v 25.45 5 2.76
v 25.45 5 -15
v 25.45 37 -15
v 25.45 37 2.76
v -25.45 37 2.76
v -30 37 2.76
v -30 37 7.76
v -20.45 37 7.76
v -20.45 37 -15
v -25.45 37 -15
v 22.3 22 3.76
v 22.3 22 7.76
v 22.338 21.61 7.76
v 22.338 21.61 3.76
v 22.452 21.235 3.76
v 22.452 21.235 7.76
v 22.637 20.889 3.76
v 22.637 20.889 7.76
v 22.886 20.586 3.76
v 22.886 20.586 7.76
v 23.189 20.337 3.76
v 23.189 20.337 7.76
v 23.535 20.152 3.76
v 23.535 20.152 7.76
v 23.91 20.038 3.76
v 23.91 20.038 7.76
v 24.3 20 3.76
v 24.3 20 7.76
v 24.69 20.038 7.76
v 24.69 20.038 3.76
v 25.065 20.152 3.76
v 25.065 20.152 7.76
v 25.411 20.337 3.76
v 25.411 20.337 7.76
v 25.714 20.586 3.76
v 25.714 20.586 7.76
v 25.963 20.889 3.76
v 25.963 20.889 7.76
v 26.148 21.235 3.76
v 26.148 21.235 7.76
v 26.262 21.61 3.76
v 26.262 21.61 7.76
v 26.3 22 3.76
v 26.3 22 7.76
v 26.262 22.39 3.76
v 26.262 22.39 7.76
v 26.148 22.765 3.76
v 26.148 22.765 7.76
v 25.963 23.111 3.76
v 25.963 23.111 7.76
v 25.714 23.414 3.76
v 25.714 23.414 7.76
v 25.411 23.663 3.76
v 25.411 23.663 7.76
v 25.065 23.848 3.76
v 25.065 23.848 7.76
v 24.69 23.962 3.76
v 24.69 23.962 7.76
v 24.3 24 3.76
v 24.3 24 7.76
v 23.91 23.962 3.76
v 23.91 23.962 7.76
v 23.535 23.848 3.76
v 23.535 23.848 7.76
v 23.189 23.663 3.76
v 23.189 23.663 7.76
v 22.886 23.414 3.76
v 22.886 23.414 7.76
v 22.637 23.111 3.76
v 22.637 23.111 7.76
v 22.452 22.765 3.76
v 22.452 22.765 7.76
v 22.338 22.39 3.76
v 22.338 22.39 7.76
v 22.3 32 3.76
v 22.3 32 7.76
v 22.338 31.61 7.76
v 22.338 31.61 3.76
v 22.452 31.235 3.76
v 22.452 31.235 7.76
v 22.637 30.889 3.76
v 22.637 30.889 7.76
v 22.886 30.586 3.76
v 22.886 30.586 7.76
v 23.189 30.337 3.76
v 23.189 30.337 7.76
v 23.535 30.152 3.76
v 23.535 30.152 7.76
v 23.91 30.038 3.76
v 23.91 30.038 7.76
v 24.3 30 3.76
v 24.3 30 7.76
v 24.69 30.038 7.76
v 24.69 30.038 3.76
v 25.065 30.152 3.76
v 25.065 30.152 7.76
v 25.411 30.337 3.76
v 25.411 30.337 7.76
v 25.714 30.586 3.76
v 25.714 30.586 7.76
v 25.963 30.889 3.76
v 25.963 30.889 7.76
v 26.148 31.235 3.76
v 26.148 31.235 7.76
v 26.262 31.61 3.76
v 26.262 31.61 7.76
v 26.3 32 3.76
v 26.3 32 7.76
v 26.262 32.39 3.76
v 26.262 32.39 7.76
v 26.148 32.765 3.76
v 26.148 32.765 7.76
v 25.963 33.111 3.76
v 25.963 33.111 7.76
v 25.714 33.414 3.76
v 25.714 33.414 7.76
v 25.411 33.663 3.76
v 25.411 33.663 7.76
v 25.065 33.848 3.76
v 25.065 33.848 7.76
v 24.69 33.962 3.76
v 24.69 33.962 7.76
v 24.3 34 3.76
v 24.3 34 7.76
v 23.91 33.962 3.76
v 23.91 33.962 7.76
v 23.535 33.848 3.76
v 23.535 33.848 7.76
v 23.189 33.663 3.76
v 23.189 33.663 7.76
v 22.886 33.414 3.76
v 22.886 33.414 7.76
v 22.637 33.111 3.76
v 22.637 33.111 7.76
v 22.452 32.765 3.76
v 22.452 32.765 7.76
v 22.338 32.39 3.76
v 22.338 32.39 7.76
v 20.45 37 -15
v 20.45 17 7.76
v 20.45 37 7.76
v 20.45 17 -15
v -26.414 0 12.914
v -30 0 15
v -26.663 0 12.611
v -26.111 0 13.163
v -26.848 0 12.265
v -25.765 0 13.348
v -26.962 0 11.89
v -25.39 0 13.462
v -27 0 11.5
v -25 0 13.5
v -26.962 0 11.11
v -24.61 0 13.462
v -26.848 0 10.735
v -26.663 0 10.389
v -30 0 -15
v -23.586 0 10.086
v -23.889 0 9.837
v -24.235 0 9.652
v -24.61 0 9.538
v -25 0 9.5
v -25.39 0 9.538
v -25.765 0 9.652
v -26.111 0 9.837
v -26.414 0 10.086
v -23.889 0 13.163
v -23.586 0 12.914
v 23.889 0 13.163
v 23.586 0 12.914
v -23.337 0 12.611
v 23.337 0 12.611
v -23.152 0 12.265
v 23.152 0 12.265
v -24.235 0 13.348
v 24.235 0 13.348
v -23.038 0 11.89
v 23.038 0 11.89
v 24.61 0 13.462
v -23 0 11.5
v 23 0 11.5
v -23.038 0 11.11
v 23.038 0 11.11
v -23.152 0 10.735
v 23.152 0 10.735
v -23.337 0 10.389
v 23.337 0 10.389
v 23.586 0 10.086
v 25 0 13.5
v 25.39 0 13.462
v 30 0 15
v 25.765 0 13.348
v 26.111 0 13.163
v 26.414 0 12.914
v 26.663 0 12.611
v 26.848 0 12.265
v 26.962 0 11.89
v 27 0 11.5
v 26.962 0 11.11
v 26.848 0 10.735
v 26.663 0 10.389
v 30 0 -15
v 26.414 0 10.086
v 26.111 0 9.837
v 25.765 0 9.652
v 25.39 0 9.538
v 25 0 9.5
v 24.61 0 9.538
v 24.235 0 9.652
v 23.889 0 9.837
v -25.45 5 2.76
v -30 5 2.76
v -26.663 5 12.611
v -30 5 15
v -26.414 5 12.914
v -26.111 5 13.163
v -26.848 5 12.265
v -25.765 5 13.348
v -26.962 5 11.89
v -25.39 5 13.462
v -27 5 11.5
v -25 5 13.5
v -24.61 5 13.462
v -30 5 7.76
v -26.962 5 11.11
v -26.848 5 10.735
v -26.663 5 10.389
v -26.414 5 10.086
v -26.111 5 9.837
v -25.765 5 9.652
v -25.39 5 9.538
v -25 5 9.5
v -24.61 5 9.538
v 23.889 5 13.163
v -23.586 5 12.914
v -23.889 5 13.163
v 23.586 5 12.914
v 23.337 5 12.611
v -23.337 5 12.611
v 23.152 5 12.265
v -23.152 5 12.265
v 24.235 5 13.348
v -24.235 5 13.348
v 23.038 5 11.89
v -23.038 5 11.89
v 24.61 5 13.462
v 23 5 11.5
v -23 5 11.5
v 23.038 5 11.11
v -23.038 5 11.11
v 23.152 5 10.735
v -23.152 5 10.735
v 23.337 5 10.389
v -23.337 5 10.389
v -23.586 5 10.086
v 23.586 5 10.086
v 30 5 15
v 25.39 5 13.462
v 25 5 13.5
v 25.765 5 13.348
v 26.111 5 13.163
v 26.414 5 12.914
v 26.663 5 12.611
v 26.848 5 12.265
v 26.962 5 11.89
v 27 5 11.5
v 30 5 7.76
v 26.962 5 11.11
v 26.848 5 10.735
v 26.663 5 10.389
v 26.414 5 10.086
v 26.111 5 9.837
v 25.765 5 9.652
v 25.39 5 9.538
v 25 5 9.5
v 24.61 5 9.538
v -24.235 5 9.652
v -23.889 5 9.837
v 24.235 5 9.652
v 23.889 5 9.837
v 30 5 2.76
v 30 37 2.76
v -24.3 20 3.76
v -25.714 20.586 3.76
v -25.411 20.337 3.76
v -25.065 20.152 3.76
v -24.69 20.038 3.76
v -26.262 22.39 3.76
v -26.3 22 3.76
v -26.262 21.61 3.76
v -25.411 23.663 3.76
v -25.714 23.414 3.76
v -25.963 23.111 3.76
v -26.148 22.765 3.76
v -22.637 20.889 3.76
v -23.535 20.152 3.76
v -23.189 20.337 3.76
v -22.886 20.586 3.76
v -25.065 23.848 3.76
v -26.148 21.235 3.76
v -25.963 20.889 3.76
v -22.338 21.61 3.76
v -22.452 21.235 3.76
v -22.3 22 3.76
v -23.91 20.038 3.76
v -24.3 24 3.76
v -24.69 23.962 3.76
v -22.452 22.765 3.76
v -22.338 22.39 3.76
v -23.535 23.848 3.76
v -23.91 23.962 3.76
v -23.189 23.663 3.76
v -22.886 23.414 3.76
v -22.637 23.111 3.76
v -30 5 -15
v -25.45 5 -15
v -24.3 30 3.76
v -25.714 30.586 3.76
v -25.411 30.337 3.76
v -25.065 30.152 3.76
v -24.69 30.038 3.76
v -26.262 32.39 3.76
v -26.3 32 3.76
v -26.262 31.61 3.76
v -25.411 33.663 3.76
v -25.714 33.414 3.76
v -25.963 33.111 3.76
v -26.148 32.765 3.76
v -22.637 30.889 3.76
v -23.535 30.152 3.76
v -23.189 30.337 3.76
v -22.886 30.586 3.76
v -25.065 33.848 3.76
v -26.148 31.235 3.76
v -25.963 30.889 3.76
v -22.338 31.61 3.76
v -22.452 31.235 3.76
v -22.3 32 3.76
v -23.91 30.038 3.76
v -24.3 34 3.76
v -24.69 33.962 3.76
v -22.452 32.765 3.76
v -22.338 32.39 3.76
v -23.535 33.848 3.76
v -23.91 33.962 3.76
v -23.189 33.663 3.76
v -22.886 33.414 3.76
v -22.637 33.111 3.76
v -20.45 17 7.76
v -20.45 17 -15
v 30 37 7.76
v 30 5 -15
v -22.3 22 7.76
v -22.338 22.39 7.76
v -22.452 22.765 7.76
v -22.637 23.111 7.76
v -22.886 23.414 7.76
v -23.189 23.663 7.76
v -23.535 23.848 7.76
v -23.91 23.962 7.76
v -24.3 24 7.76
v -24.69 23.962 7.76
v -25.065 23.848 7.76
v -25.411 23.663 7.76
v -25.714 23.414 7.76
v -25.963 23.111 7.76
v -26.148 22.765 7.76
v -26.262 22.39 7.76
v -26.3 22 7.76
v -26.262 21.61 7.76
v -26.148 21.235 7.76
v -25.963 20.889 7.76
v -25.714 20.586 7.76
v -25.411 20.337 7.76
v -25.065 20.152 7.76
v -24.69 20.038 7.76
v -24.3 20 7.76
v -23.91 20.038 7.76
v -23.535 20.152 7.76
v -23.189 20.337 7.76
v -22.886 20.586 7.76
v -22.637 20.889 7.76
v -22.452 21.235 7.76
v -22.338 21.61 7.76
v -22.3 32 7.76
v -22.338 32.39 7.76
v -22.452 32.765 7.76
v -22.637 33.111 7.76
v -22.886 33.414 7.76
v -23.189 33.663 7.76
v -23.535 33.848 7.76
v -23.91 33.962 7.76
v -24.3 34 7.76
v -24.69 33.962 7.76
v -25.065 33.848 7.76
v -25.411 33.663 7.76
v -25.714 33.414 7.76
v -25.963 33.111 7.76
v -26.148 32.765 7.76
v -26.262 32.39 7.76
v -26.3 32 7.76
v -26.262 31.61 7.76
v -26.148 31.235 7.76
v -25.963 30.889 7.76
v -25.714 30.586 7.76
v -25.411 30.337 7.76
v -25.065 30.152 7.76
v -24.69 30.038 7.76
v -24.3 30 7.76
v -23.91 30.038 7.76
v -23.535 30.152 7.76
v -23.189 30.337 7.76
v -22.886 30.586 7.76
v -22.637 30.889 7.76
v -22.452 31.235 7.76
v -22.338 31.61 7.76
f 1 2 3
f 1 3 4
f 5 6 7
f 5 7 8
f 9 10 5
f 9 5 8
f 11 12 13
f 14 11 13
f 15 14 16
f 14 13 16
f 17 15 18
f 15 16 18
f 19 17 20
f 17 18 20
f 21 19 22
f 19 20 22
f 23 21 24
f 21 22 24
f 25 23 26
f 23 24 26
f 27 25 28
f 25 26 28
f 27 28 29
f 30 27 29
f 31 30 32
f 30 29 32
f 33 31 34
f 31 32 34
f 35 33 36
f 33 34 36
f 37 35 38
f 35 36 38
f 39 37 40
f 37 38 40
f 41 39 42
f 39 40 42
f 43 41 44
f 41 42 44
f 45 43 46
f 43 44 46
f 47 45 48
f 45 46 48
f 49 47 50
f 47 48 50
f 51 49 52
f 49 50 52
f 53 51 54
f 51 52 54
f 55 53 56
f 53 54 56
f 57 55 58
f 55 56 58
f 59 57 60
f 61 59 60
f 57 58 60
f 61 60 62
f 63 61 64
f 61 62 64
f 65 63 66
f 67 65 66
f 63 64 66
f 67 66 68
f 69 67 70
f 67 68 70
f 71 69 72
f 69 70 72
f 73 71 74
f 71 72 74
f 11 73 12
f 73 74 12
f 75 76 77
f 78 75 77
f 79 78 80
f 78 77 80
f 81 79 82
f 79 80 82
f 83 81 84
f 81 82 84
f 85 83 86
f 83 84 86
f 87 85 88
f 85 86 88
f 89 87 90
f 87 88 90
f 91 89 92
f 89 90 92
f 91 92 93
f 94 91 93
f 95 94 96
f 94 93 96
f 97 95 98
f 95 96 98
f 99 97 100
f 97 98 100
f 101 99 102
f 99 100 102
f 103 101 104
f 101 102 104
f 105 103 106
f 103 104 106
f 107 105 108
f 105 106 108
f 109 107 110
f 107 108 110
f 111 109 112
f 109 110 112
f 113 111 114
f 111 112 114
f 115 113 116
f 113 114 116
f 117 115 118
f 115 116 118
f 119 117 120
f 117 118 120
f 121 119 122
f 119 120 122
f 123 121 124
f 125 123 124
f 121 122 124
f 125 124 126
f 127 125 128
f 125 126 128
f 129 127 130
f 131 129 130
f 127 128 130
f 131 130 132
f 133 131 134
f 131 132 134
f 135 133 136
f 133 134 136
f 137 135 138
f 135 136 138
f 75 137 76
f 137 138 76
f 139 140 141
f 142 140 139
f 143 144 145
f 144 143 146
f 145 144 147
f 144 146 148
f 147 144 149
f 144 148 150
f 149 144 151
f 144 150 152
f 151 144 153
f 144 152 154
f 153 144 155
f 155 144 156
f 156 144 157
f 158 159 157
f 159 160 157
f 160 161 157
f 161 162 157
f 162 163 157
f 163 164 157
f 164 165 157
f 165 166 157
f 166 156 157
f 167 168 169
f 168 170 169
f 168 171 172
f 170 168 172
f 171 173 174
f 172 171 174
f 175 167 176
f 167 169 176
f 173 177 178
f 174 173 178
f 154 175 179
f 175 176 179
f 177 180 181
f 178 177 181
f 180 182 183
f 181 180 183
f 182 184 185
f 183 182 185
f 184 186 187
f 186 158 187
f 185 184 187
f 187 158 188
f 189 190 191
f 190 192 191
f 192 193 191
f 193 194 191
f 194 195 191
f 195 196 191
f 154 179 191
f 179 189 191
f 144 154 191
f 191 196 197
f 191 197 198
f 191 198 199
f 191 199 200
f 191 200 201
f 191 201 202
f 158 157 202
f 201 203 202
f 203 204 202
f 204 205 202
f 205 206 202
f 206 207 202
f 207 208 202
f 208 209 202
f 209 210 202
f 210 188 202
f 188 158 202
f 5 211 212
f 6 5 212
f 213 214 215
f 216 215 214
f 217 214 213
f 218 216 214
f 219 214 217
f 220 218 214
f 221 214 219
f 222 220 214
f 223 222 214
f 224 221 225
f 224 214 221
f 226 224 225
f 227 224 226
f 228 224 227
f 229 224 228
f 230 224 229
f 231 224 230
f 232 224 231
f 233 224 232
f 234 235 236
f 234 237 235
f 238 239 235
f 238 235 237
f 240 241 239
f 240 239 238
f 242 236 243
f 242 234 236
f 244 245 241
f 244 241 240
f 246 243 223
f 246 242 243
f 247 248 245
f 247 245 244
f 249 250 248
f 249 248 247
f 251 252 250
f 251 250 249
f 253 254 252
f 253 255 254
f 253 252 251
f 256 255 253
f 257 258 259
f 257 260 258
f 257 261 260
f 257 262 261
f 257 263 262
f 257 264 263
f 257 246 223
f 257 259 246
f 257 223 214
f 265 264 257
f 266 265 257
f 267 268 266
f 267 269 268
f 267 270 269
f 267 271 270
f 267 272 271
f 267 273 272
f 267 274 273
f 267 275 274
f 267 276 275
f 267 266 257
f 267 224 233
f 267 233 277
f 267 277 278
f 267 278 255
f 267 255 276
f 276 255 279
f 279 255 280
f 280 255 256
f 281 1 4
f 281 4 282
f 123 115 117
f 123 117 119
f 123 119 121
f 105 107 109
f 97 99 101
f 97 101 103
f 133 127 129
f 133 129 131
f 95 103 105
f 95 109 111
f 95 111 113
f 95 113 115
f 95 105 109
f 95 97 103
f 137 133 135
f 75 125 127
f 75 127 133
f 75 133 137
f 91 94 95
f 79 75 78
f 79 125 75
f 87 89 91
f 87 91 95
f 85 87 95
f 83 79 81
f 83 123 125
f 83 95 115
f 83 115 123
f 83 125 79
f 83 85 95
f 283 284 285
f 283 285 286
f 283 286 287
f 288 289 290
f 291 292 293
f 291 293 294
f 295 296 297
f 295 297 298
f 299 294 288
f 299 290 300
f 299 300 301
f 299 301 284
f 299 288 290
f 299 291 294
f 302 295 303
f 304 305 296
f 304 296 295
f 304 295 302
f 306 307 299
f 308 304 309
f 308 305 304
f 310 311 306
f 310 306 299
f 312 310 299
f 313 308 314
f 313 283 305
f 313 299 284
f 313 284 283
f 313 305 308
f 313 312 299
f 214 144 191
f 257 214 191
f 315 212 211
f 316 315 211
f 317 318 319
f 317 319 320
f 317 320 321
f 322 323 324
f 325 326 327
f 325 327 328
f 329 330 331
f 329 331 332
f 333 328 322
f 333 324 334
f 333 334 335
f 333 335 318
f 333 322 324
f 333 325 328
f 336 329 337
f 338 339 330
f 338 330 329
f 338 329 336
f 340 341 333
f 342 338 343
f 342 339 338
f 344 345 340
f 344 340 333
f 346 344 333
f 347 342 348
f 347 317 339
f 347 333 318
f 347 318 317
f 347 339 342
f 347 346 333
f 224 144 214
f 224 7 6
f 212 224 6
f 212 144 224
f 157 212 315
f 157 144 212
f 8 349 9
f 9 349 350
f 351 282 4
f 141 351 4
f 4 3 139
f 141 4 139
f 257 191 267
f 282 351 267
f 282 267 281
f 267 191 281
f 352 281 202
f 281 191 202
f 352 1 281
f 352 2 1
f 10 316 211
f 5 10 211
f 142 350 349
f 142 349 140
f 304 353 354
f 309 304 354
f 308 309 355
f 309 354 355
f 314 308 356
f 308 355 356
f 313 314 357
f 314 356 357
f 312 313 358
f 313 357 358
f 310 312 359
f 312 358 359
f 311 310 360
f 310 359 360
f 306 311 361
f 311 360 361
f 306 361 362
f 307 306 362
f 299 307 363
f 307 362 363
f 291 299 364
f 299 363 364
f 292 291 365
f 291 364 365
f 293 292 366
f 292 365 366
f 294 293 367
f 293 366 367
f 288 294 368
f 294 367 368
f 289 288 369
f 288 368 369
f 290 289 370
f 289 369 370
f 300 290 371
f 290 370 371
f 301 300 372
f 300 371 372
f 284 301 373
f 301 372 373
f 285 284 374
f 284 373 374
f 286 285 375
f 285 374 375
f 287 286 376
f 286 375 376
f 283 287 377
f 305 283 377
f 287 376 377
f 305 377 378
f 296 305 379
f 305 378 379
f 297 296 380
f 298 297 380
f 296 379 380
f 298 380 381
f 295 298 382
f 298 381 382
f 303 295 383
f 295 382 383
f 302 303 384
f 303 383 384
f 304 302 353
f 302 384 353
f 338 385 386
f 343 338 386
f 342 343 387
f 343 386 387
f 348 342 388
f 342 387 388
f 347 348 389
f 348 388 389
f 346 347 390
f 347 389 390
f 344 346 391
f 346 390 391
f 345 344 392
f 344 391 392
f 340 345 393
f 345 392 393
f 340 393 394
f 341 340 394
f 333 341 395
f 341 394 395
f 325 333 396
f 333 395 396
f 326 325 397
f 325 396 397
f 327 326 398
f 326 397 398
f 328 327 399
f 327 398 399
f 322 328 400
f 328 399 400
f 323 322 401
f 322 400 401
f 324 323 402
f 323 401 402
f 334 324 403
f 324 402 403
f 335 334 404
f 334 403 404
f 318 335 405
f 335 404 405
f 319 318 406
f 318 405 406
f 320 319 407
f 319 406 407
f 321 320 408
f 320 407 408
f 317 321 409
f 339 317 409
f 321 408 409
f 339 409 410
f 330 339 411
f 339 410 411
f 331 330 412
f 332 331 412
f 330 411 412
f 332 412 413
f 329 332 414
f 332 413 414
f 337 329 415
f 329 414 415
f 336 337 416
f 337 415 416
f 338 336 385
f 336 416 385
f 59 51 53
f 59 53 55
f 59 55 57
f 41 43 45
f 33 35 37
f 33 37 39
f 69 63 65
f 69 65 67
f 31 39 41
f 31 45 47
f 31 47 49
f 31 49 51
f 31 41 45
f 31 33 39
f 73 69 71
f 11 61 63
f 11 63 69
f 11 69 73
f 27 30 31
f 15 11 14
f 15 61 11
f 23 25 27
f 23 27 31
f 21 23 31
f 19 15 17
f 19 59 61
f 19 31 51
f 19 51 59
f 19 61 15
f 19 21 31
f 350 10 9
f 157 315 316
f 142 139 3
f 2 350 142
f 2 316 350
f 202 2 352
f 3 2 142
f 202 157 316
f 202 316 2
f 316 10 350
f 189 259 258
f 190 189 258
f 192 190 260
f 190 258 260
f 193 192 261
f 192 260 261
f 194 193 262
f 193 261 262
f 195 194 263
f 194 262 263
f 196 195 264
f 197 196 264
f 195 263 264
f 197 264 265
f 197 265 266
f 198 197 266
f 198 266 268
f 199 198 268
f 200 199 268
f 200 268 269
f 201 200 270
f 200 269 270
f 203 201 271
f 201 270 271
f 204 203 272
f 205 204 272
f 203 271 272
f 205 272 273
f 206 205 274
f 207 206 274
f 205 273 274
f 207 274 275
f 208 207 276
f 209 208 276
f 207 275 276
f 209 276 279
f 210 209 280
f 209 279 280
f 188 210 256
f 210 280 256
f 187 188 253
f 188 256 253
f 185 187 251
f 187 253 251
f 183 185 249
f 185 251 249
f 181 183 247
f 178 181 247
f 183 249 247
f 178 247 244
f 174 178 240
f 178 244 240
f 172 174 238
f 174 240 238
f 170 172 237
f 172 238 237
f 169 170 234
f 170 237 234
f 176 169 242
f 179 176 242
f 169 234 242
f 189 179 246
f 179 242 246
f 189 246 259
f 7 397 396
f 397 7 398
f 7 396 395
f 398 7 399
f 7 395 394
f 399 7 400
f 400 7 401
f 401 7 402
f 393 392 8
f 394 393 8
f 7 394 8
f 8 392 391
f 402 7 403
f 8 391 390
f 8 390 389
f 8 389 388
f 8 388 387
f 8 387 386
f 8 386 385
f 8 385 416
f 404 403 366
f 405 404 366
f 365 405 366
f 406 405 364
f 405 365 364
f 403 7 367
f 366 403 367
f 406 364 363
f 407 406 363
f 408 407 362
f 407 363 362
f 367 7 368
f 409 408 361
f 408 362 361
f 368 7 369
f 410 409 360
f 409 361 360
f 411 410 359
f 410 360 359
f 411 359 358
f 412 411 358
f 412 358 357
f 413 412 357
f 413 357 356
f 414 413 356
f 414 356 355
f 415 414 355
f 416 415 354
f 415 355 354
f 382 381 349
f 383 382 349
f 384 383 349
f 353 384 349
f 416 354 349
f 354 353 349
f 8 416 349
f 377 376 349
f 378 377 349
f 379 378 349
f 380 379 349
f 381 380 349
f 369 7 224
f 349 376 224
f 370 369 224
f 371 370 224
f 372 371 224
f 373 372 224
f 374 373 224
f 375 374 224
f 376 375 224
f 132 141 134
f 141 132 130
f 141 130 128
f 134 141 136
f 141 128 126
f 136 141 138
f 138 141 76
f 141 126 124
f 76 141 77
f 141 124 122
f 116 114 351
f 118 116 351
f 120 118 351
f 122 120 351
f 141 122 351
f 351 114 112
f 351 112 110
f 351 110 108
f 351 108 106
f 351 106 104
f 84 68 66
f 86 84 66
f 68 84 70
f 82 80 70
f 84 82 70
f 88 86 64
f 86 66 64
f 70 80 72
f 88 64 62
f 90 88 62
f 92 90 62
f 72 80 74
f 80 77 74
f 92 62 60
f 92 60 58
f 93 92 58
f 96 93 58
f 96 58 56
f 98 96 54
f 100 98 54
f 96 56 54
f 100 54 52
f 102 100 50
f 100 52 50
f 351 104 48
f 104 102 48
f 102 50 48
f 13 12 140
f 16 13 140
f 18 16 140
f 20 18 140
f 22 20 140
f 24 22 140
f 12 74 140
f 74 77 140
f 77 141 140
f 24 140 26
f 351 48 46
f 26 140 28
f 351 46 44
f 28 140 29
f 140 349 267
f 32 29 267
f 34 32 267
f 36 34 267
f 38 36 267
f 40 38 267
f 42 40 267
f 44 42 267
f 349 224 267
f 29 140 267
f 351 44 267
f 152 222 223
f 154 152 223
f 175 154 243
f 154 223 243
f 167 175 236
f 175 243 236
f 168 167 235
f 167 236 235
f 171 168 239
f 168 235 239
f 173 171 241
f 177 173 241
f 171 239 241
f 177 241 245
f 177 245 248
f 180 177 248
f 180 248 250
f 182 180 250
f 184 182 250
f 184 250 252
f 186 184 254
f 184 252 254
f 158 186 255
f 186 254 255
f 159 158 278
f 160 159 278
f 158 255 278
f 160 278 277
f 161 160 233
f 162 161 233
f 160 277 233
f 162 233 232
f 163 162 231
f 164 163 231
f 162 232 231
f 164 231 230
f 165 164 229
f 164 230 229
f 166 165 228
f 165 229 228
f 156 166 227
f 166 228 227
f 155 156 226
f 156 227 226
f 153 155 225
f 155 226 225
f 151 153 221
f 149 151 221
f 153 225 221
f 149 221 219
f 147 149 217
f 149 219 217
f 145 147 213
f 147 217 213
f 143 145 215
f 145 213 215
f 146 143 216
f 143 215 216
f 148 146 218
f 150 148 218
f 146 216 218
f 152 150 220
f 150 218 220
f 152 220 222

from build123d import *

# Parameters (mm, degrees)
SKETCH1_W           = 60
SKETCH1_H           = 30
BOSS_EXTRUDE1_DEPTH = 5
BOSS_EXTRUDE4_DEPTH = 32
SKETCH7_W           = 40.9
SKETCH7_H           = 22.76
BOSS_EXTRUDE5_DEPTH = 12
SKETCH9_R           = 2
CUT_EXTRUDE2_DEPTH  = 5
SKETCH10_R          = 2
CUT_EXTRUDE3_DEPTH  = 4


with BuildPart() as part:
    # Sketch1 → Boss-Extrude1 (new body)
    with BuildSketch(Plane(origin=(0, 0, 0), x_dir=(1, 0, 0), z_dir=(0, 1, 0))):
        Rectangle(SKETCH1_W, SKETCH1_H)
    extrude(amount=BOSS_EXTRUDE1_DEPTH)

    # Sketch6 → Boss-Extrude4 (add)
    with BuildSketch(Plane(origin=(0, 5, 0), x_dir=(1, 0, 0), z_dir=(0, 1, 0))):
        Polygon((-20.45, 15), (-25.45, 15), (-25.45, -2.76), (-30, -2.76), (-30, -7.76), (-20.45, -7.76), align=None)
        Polygon((30, -2.76), (30, -7.76), (20.45, -7.76), (20.45, 15), (25.45, 15), (25.45, -2.76), align=None)
    extrude(amount=BOSS_EXTRUDE4_DEPTH)

    # Sketch7 → Boss-Extrude5 (add)
    with BuildSketch(Plane(origin=(0, 5, 0), x_dir=(1, 0, 0), z_dir=(0, 1, 0))):
        with Locations((0, 3.62)):
            Rectangle(SKETCH7_W, SKETCH7_H)
    extrude(amount=BOSS_EXTRUDE5_DEPTH)

    # Sketch9 → Cut-Extrude2 (cut)
    with BuildSketch(Plane(origin=(0, 5, 0), x_dir=(1, 0, 0), z_dir=(0, 1, 0))):
        with Locations(Location((-25, -11.5, 0), (0, 0, 270))):
            Circle(SKETCH9_R)
        with Locations(Location((25, -11.5, 0), (0, 0, 270))):
            Circle(SKETCH9_R)
    extrude(amount=-CUT_EXTRUDE2_DEPTH, mode=Mode.SUBTRACT)

    # Sketch10 → Cut-Extrude3 (cut)
    with BuildSketch(Plane.XY.offset(7.76)):
        with Locations((-24.3, 32)):
            Circle(SKETCH10_R)
        with Locations((-24.3, 22)):
            Circle(SKETCH10_R)
        with Locations(Location((24.3, 22, 0), (0, 0, 180))):
            Circle(SKETCH10_R)
        with Locations(Location((24.3, 32, 0), (0, 0, 180))):
            Circle(SKETCH10_R)
    extrude(amount=-CUT_EXTRUDE3_DEPTH, mode=Mode.SUBTRACT)


solid = part.part
